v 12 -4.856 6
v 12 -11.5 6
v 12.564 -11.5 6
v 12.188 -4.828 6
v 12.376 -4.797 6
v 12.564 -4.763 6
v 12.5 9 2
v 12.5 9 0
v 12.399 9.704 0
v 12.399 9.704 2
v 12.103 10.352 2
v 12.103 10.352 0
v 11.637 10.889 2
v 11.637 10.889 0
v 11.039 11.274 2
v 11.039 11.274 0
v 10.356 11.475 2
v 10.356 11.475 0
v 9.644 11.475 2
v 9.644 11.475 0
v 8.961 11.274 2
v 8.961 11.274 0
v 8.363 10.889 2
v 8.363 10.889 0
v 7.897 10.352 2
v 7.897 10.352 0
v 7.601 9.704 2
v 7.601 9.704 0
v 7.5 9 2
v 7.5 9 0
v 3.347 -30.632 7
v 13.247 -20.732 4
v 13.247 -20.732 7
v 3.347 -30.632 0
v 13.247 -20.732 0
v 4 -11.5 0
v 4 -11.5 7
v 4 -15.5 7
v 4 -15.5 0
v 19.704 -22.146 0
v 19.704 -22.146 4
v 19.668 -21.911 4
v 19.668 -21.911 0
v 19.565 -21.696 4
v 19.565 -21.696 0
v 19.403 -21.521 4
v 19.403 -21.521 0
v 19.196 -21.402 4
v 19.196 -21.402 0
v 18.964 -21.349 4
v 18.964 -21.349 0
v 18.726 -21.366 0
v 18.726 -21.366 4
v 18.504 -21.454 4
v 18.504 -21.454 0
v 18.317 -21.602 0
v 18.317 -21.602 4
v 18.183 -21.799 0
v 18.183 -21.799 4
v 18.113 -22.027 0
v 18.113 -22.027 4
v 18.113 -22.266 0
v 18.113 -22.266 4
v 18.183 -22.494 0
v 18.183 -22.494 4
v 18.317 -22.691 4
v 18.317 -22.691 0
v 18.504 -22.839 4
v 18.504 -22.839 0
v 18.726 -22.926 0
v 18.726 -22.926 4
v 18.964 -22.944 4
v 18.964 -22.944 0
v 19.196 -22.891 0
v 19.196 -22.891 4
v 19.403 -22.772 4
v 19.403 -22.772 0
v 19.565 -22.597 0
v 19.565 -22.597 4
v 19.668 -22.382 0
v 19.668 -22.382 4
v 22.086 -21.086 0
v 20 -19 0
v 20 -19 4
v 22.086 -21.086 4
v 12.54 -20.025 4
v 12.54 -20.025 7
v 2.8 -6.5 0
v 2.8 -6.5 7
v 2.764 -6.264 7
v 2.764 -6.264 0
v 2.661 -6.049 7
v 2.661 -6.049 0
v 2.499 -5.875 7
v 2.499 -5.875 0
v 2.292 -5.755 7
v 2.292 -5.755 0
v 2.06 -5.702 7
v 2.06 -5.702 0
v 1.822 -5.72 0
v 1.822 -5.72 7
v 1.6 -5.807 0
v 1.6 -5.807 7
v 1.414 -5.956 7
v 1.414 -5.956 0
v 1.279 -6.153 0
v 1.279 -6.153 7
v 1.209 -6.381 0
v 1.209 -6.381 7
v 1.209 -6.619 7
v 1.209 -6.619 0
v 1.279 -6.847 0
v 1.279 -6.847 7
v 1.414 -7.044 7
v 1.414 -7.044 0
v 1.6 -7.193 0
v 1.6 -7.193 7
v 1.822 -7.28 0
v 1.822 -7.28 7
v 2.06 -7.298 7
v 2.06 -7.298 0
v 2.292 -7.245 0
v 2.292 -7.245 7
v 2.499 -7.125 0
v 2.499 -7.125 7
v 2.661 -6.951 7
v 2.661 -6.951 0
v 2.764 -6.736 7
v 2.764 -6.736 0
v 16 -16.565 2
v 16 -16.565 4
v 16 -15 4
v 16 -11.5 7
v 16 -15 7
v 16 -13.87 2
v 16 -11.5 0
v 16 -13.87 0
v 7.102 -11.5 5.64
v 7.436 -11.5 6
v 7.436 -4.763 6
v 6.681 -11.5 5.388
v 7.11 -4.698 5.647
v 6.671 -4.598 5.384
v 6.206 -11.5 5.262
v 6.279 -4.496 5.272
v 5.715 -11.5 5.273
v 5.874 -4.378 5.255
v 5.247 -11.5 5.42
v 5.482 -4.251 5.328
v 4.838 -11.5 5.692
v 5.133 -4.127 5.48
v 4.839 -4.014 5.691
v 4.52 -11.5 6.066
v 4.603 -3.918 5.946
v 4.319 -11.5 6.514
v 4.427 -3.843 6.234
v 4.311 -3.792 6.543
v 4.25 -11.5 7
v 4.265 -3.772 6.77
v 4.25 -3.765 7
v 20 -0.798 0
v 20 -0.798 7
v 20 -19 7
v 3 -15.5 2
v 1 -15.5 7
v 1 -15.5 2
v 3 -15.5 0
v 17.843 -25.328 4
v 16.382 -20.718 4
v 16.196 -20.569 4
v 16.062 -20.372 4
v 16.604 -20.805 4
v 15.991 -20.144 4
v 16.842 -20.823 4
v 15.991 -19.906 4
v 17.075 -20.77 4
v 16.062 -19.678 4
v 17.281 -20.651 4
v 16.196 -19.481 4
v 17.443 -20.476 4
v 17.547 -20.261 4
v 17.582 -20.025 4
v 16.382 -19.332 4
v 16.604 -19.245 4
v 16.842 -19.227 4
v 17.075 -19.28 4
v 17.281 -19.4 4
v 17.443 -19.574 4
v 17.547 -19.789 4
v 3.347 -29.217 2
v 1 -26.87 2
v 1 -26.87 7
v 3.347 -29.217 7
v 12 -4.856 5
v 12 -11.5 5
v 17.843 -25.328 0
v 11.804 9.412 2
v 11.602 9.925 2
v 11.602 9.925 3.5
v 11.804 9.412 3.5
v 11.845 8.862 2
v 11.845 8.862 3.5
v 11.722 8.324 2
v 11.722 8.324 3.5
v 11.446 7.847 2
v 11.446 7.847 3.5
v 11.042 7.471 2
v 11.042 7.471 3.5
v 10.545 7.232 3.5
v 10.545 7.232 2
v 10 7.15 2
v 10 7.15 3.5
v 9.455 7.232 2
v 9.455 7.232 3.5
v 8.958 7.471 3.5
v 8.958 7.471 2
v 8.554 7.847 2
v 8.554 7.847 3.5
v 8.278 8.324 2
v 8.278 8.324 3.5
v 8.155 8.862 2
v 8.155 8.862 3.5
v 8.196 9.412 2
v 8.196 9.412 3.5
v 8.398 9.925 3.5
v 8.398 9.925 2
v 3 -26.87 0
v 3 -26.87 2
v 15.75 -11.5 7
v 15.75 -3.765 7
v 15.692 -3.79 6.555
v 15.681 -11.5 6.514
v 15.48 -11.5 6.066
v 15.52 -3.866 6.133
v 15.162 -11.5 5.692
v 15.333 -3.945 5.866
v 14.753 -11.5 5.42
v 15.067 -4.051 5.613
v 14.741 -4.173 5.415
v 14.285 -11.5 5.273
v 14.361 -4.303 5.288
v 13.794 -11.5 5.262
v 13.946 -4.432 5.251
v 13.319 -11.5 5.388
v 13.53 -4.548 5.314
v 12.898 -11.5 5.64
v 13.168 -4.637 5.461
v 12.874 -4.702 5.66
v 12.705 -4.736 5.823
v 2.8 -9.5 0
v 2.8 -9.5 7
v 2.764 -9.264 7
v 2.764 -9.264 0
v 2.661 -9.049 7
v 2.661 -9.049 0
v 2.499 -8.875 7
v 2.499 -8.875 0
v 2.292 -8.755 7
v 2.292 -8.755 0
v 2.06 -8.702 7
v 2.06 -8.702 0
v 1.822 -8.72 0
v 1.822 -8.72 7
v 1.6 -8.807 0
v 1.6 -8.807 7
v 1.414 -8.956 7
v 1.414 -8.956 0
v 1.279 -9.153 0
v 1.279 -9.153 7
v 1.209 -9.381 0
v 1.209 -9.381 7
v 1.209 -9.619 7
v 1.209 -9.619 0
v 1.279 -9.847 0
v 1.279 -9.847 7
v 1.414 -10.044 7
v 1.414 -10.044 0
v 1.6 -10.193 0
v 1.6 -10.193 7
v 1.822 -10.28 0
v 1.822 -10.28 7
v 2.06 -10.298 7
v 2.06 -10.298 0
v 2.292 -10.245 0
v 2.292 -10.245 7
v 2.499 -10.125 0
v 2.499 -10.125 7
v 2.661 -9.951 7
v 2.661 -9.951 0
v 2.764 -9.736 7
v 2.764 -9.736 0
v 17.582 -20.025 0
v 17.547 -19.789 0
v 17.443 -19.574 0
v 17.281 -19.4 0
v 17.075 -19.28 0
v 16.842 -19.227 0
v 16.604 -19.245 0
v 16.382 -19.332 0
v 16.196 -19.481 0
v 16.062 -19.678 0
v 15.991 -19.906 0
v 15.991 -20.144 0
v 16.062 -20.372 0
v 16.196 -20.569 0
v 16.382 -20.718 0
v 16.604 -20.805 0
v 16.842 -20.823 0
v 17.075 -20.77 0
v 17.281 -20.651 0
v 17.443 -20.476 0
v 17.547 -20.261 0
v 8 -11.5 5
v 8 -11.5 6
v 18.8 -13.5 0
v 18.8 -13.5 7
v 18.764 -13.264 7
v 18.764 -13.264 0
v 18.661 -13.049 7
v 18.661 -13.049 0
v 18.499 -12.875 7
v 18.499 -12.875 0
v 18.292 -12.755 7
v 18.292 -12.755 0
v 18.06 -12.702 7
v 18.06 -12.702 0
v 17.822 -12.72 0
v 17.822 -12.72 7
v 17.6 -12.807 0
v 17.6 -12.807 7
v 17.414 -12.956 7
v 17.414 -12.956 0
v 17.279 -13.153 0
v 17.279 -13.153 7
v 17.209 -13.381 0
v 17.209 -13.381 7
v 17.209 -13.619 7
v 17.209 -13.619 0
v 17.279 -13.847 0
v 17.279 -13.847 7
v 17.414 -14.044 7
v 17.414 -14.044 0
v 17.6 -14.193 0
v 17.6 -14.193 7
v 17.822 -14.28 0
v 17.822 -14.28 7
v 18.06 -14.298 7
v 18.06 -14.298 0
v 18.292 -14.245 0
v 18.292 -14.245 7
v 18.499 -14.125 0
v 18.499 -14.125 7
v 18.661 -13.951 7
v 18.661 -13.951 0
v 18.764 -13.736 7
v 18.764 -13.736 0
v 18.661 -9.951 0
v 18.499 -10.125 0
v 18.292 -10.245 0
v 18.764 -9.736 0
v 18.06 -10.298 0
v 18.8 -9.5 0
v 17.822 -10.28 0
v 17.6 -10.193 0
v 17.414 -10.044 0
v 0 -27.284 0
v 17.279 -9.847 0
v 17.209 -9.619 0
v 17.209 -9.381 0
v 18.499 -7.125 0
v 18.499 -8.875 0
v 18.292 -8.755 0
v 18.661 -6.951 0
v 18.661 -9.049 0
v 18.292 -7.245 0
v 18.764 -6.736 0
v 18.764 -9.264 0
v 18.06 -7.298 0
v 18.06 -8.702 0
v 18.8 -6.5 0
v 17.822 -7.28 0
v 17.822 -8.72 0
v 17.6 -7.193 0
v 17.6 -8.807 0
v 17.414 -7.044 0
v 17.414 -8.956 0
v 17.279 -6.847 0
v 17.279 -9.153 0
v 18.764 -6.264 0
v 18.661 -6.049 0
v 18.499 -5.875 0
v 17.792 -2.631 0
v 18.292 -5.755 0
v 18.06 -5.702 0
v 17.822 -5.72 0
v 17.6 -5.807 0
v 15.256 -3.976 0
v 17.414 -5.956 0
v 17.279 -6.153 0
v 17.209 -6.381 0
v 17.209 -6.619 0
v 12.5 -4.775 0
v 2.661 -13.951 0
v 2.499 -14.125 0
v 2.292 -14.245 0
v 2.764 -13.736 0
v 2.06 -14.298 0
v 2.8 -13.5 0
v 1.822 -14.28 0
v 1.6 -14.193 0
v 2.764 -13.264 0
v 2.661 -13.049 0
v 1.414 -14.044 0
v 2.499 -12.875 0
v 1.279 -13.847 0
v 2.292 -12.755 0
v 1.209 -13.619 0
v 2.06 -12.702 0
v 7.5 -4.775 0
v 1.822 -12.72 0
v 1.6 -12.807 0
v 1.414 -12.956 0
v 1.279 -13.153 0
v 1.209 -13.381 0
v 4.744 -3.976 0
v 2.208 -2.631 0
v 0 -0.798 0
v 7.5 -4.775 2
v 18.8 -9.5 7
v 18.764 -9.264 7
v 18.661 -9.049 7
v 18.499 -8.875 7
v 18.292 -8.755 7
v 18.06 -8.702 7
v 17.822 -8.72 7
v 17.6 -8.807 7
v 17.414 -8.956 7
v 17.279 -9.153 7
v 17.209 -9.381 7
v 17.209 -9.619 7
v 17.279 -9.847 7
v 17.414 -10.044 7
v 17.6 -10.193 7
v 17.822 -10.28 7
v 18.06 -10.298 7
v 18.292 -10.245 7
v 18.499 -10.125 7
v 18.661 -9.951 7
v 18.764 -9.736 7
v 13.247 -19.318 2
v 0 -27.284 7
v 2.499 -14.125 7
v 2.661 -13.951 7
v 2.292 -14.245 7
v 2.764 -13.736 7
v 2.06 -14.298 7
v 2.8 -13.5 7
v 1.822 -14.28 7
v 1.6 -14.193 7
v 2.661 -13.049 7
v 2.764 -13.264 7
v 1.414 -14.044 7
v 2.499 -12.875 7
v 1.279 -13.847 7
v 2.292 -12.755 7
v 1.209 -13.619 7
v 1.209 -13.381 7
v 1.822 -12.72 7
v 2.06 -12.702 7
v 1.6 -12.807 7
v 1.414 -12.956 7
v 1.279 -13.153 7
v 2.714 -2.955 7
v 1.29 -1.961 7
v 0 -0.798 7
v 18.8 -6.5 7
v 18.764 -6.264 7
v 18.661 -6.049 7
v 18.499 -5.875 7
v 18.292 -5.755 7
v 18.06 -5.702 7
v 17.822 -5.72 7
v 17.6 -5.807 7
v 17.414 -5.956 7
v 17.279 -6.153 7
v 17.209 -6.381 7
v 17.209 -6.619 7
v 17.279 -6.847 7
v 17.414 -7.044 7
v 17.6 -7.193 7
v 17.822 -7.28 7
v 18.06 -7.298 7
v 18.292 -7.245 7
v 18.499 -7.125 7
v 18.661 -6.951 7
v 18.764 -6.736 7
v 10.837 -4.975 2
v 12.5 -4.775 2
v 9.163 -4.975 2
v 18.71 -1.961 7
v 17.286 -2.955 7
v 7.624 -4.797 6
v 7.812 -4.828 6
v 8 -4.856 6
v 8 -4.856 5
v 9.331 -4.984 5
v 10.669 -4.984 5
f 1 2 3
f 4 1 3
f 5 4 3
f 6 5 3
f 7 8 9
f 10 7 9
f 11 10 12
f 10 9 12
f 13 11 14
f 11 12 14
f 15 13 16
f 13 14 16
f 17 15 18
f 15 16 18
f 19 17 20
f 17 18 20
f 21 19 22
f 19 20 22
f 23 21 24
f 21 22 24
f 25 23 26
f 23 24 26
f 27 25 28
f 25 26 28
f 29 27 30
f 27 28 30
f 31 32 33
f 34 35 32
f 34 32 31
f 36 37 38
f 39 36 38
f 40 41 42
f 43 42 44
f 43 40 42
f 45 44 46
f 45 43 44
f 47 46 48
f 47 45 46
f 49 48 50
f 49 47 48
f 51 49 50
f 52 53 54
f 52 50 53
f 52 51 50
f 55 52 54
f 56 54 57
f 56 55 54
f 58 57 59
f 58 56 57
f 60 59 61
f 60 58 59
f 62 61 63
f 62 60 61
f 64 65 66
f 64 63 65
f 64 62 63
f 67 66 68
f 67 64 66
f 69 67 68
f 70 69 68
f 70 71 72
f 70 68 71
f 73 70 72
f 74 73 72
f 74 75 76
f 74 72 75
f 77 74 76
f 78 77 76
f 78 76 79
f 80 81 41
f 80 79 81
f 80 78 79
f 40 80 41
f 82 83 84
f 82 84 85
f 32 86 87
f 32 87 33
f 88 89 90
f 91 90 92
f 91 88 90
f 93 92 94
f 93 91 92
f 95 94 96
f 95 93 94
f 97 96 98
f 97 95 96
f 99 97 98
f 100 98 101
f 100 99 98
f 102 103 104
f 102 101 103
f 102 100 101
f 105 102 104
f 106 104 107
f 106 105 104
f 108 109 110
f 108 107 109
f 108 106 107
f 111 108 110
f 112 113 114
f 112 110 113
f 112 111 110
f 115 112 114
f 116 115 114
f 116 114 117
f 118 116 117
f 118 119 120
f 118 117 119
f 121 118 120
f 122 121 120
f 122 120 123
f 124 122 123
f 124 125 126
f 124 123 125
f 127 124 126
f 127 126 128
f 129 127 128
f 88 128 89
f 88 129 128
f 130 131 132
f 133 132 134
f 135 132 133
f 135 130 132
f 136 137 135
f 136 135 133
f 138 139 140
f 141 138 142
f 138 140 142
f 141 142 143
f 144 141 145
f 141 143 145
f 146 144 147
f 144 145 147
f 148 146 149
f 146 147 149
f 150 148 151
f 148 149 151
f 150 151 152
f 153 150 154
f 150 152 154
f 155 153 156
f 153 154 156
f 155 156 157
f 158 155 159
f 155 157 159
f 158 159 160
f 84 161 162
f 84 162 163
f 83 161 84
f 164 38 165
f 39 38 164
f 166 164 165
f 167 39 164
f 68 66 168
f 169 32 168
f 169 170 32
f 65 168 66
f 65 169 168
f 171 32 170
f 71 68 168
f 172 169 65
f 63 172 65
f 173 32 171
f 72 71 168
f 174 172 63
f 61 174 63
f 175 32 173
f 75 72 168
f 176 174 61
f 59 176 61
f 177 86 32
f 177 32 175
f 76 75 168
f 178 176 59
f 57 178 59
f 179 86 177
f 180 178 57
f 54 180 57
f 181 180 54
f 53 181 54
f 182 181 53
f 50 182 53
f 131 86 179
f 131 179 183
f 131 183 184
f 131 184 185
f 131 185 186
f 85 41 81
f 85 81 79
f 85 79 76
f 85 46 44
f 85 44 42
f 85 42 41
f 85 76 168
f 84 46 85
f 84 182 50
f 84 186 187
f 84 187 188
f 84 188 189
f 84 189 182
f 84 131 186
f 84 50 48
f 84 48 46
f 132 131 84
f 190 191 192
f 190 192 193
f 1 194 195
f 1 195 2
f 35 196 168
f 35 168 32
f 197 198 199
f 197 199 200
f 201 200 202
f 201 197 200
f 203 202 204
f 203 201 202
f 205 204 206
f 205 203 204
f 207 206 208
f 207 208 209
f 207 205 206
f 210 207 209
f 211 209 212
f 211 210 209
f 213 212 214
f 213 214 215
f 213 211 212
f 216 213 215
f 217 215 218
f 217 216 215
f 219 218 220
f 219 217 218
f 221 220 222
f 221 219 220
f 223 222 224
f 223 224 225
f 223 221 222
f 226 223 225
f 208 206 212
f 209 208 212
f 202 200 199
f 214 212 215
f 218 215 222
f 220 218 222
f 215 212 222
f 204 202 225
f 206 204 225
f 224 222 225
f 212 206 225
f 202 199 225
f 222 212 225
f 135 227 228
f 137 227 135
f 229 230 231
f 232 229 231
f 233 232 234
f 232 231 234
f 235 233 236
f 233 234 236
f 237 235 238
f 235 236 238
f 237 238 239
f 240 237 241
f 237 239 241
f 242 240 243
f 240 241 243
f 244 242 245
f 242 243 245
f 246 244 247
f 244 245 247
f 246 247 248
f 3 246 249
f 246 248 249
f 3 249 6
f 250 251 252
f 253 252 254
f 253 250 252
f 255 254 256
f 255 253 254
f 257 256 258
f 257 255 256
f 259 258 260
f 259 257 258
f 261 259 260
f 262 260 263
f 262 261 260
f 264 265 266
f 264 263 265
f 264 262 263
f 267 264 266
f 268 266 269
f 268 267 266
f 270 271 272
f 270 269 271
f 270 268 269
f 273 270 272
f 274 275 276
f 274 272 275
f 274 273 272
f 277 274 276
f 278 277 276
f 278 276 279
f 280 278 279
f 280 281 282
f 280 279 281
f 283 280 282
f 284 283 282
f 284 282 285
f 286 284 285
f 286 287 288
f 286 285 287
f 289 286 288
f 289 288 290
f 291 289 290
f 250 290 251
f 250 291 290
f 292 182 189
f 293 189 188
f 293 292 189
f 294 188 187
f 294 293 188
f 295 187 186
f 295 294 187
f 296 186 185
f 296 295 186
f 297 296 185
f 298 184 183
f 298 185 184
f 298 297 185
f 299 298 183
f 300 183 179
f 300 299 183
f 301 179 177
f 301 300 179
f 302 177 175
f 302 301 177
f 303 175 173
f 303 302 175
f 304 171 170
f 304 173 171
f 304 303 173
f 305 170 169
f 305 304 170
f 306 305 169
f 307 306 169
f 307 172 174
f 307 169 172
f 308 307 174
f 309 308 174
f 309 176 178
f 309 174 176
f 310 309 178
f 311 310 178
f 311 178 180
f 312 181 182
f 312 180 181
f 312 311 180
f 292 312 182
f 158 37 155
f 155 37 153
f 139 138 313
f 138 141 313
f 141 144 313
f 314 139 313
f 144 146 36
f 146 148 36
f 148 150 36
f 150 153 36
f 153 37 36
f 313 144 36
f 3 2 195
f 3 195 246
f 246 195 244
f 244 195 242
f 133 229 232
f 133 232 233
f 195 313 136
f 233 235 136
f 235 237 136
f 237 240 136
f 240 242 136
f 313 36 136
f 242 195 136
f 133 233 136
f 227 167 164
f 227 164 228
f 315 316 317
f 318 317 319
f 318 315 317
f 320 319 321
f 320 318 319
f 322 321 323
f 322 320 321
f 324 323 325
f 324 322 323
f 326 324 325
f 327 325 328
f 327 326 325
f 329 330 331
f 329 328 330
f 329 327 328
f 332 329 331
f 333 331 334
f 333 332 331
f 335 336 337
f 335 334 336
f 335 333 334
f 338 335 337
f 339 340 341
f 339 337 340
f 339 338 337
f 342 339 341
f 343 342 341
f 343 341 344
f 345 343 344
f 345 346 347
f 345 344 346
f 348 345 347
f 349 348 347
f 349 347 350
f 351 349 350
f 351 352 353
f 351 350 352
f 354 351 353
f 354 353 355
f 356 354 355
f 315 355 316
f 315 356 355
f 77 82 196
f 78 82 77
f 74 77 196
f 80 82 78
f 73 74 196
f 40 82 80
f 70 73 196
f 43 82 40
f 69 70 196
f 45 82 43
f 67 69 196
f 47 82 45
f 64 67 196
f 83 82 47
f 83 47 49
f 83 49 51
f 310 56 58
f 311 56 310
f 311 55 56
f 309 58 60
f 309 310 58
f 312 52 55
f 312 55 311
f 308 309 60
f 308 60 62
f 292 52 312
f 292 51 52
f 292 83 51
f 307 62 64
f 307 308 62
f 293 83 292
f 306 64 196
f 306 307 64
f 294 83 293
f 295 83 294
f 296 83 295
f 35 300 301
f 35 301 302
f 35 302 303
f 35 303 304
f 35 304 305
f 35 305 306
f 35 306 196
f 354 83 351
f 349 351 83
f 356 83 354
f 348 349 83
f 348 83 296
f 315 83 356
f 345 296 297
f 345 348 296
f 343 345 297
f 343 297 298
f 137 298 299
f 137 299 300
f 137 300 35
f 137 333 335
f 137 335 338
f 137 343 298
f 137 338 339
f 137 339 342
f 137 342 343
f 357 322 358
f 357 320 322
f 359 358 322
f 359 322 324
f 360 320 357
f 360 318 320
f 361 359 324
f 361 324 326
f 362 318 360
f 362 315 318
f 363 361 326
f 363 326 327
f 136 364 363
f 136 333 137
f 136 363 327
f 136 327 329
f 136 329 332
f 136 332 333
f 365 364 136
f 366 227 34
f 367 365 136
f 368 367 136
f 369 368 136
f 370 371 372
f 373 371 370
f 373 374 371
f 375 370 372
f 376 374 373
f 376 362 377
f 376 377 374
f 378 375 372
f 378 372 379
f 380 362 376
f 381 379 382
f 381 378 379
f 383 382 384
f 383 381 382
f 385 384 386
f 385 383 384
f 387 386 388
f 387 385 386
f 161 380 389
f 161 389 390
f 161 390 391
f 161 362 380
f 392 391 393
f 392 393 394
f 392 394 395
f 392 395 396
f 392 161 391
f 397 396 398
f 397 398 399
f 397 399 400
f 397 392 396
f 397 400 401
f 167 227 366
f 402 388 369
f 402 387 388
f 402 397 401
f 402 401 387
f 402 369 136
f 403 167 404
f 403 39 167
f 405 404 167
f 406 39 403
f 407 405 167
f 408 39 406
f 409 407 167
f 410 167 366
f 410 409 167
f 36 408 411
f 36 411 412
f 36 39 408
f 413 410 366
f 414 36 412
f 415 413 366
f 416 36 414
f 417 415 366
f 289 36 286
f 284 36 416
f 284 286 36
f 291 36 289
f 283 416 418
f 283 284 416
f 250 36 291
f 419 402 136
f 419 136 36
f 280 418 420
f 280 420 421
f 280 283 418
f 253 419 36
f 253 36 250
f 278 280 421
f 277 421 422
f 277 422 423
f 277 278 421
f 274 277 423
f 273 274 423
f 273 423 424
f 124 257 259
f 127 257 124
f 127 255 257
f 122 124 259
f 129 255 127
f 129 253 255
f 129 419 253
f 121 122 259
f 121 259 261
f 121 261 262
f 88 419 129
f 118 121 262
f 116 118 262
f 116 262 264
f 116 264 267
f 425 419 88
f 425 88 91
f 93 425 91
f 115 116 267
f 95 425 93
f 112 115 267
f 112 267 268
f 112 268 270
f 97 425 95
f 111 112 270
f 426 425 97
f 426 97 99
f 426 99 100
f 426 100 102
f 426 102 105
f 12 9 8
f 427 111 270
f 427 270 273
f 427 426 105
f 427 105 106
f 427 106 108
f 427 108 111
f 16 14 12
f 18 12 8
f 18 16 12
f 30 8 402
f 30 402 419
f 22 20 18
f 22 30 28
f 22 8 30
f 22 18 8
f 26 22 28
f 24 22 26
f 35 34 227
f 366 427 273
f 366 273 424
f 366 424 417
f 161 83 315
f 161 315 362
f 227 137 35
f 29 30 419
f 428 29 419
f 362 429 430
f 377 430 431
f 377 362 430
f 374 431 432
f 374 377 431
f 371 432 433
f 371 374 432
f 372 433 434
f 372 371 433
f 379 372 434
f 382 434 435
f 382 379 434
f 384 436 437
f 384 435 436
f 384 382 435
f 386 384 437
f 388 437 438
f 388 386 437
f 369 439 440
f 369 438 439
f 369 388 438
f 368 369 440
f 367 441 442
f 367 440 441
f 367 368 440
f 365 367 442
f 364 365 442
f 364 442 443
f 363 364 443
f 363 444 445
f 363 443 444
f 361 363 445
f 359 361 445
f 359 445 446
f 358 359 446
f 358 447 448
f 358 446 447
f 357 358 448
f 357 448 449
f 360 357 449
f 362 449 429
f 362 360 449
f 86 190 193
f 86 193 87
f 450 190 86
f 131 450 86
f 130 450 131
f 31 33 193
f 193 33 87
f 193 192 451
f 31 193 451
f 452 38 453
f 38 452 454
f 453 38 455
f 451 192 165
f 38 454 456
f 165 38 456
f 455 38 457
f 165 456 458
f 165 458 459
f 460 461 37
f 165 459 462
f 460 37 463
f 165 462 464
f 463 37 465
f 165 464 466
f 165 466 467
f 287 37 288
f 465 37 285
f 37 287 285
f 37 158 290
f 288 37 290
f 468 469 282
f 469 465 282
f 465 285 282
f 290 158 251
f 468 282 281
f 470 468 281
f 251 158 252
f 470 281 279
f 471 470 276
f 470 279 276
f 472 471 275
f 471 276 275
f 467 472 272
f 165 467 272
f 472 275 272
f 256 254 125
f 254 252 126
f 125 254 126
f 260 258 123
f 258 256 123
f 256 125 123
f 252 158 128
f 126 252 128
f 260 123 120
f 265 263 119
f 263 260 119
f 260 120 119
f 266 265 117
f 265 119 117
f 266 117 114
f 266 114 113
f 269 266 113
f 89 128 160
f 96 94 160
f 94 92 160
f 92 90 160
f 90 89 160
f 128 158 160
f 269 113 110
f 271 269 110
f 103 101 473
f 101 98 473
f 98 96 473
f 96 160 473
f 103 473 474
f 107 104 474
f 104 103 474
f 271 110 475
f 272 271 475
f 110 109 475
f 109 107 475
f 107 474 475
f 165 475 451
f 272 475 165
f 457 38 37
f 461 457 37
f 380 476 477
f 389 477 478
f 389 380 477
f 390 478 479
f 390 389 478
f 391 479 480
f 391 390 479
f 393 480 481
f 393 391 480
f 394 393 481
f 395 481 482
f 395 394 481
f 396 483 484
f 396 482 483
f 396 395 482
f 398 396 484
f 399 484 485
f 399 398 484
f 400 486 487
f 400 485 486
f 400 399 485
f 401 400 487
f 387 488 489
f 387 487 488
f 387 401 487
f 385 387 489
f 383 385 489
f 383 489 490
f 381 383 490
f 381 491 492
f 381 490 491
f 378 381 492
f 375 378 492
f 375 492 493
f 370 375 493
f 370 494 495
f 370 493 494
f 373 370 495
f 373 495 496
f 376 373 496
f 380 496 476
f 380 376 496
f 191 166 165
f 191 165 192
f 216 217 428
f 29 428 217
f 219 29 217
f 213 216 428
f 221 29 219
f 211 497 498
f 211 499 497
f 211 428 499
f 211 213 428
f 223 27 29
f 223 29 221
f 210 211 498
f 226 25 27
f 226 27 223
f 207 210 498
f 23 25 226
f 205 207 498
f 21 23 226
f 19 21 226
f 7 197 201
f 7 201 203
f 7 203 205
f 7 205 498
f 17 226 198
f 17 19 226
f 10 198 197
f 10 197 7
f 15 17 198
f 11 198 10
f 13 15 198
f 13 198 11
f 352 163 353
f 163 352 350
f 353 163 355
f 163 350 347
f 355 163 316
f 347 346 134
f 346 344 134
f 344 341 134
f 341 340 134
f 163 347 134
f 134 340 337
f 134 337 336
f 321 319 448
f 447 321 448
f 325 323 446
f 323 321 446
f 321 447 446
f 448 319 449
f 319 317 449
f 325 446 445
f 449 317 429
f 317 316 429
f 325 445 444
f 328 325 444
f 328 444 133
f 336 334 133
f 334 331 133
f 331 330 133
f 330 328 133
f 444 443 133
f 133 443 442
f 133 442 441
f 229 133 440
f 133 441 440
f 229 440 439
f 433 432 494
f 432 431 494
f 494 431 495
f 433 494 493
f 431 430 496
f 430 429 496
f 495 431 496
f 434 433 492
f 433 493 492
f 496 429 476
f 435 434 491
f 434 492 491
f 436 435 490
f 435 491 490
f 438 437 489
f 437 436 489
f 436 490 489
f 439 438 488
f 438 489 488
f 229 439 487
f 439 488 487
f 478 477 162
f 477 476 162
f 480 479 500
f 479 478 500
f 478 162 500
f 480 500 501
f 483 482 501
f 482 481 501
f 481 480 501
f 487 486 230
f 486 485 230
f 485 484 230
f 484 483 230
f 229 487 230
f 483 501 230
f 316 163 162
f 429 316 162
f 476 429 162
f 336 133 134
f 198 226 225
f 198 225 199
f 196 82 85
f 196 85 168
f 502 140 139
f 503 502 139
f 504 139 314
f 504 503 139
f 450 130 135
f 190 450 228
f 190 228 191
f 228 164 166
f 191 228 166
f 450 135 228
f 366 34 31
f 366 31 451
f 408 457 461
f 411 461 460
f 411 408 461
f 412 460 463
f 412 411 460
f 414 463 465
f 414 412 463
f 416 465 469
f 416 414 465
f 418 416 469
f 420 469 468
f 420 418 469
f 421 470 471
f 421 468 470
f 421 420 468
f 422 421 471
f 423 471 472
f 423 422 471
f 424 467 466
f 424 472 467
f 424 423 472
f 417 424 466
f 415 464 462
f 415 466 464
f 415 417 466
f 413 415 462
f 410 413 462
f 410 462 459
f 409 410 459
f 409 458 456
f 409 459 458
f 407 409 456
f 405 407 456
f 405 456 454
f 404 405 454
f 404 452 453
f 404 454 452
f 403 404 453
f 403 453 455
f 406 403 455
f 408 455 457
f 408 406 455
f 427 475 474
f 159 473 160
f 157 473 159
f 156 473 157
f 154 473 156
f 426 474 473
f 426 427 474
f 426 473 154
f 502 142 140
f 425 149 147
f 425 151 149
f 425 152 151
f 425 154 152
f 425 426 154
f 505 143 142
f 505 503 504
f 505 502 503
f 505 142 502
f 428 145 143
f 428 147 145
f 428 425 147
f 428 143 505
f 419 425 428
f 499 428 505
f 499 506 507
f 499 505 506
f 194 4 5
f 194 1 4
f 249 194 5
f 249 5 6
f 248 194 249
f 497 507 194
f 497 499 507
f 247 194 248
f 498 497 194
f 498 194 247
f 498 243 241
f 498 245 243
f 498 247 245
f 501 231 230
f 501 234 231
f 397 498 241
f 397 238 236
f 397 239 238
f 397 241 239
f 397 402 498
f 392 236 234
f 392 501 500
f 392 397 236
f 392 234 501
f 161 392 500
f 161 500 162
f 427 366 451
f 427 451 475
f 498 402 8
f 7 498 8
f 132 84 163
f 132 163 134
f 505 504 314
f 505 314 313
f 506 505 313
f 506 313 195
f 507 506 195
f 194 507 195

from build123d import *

# Parameters (mm, degrees)
BOSS_EXTRUDE1_DEPTH        = 7
BOSS_EXTRUDE2_DEPTH        = 2
BOSS_EXTRUDE3_DEPTH        = 2
BOSS_EXTRUDE4_START        = 2
BOSS_EXTRUDE4_DEPTH        = 1.5
WIRE_START                 = -3
SKETCH3_R                  = 1.75
WIRE_AND_TUBE_CANALS_DEPTH = 8.5
SKETCH5_R                  = 0.8
SKETCH5_R_2                = 0.799999999
SCREW_HOLES_DEPTH          = 8.0000001
CUT_EXTRUDE1_START         = 4
CUT_EXTRUDE1_DEPTH         = 3


with BuildPart() as part:
    # Sketch1 → Boss-Extrude1 (new body)
    with BuildSketch(Plane.XY):
        with BuildLine():
            Line((13.246912191, -20.732193563), (3.347417254, -30.6316885))
            Line((3.347417254, -30.6316885), (0, -27.284271246))
            Line((0, -27.284271246), (0, -0.797958973))
            ThreePointArc((0, -0.797958973), (9.999999999, -5), (19.999999998, -0.797958971))
            Line((19.999999998, -0.797958971), (19.999999998, -19))
            Line((19.999999998, -19), (22.085746954, -21.085746956))
            Line((22.085746954, -21.085746956), (17.843106269, -25.328387641))
            Line((17.843106269, -25.328387641), (13.246912191, -20.732193563))
        make_face()
        Polygon((1, -15.5), (1, -26.870057685), (3.347417253, -29.217474938), (15.999999998, -16.564892192), (15.999999998, -11.5), (4, -11.5), (4, -15.5), align=None, mode=Mode.SUBTRACT)
    extrude(amount=BOSS_EXTRUDE1_DEPTH)

    # Sketch6 → Boss-Extrude2 (add)
    with BuildSketch(Plane.XY):
        Polygon((1, -11.5), (3, -11.5), (3, -26.87005769), (17, -12.87005769), (17, -11.500000008), (19, -11.500000008), (19, -18.000000005), (17.843106267, -16.843106272), (14.307572361, -20.378640178), (13.246912189, -19.317980006), (3.347417253, -29.217474943), (1, -26.87005769), align=None)
    extrude(amount=BOSS_EXTRUDE2_DEPTH)

    # Sketch8 → Boss-Extrude3 (add)
    with BuildSketch(Plane.XY):
        with BuildLine():
            Line((10, -11.5), (12.5, -11.5))
            Line((12.5, -11.5), (12.5, 9))
            ThreePointArc((12.5, 9), (10, 11.5), (7.5, 9))
            Line((7.5, 9), (7.5, -11.5))
            Line((7.5, -11.5), (10, -11.5))
        make_face()
    extrude(amount=BOSS_EXTRUDE3_DEPTH)

    # Sketch9 → Boss-Extrude4 (add)
    with BuildSketch(Plane.XY.offset(BOSS_EXTRUDE4_START)):
        with BuildLine():
            Line((8.397853003, 9.925), (11.602146997, 9.925))
            ThreePointArc((11.602146997, 9.925), (10, 7.15), (8.397853003, 9.925))
        make_face()
    extrude(amount=BOSS_EXTRUDE4_DEPTH)

    # Sketch3 → Wire and Tube Canals (cut)
    with BuildSketch(Plane(origin=(0, 0, 0), x_dir=(1, 0, 0), z_dir=(0, 1, 0)).offset(WIRE_START)):
        with Locations((6, -7)):
            Circle(SKETCH3_R)
        with Locations((14, -7)):
            Circle(SKETCH3_R)
        Polygon((6, -6), (8, -6), (8, -5), (12, -5), (12, -6), (14, -6), (14, -7), (6, -7), align=None)
    extrude(amount=-WIRE_AND_TUBE_CANALS_DEPTH, mode=Mode.SUBTRACT)

    # Sketch5 → Screw Holes (cut, through all)
    with BuildSketch(Plane.XY):
        with Locations((2, -6.5)):
            Circle(SKETCH5_R)
        with Locations((2, -9.5)):
            Circle(SKETCH5_R)
        with Locations((18, -9.5)):
            Circle(SKETCH5_R)
        with Locations((18, -6.5)):
            Circle(SKETCH5_R)
        with Locations((18.90376644, -22.146407127)):
            Circle(SKETCH5_R_2)
        with Locations((16.782446096, -20.025086783)):
            Circle(SKETCH5_R_2)
        with Locations((2, -13.5)):
            Circle(SKETCH5_R)
        with Locations((18, -13.5)):
            Circle(SKETCH5_R)
    extrude(amount=SCREW_HOLES_DEPTH, mode=Mode.SUBTRACT)

    # Sketch10 → Cut-Extrude1 (cut)
    with BuildSketch(Plane.XY.offset(CUT_EXTRUDE1_START)):
        Polygon((17.843106269, -25.328387641), (22.085746954, -21.085746956), (15.721785923, -14.721785925), (11.479145238, -18.96442661), align=None)
    extrude(amount=CUT_EXTRUDE1_DEPTH, mode=Mode.SUBTRACT)


solid = part.part
